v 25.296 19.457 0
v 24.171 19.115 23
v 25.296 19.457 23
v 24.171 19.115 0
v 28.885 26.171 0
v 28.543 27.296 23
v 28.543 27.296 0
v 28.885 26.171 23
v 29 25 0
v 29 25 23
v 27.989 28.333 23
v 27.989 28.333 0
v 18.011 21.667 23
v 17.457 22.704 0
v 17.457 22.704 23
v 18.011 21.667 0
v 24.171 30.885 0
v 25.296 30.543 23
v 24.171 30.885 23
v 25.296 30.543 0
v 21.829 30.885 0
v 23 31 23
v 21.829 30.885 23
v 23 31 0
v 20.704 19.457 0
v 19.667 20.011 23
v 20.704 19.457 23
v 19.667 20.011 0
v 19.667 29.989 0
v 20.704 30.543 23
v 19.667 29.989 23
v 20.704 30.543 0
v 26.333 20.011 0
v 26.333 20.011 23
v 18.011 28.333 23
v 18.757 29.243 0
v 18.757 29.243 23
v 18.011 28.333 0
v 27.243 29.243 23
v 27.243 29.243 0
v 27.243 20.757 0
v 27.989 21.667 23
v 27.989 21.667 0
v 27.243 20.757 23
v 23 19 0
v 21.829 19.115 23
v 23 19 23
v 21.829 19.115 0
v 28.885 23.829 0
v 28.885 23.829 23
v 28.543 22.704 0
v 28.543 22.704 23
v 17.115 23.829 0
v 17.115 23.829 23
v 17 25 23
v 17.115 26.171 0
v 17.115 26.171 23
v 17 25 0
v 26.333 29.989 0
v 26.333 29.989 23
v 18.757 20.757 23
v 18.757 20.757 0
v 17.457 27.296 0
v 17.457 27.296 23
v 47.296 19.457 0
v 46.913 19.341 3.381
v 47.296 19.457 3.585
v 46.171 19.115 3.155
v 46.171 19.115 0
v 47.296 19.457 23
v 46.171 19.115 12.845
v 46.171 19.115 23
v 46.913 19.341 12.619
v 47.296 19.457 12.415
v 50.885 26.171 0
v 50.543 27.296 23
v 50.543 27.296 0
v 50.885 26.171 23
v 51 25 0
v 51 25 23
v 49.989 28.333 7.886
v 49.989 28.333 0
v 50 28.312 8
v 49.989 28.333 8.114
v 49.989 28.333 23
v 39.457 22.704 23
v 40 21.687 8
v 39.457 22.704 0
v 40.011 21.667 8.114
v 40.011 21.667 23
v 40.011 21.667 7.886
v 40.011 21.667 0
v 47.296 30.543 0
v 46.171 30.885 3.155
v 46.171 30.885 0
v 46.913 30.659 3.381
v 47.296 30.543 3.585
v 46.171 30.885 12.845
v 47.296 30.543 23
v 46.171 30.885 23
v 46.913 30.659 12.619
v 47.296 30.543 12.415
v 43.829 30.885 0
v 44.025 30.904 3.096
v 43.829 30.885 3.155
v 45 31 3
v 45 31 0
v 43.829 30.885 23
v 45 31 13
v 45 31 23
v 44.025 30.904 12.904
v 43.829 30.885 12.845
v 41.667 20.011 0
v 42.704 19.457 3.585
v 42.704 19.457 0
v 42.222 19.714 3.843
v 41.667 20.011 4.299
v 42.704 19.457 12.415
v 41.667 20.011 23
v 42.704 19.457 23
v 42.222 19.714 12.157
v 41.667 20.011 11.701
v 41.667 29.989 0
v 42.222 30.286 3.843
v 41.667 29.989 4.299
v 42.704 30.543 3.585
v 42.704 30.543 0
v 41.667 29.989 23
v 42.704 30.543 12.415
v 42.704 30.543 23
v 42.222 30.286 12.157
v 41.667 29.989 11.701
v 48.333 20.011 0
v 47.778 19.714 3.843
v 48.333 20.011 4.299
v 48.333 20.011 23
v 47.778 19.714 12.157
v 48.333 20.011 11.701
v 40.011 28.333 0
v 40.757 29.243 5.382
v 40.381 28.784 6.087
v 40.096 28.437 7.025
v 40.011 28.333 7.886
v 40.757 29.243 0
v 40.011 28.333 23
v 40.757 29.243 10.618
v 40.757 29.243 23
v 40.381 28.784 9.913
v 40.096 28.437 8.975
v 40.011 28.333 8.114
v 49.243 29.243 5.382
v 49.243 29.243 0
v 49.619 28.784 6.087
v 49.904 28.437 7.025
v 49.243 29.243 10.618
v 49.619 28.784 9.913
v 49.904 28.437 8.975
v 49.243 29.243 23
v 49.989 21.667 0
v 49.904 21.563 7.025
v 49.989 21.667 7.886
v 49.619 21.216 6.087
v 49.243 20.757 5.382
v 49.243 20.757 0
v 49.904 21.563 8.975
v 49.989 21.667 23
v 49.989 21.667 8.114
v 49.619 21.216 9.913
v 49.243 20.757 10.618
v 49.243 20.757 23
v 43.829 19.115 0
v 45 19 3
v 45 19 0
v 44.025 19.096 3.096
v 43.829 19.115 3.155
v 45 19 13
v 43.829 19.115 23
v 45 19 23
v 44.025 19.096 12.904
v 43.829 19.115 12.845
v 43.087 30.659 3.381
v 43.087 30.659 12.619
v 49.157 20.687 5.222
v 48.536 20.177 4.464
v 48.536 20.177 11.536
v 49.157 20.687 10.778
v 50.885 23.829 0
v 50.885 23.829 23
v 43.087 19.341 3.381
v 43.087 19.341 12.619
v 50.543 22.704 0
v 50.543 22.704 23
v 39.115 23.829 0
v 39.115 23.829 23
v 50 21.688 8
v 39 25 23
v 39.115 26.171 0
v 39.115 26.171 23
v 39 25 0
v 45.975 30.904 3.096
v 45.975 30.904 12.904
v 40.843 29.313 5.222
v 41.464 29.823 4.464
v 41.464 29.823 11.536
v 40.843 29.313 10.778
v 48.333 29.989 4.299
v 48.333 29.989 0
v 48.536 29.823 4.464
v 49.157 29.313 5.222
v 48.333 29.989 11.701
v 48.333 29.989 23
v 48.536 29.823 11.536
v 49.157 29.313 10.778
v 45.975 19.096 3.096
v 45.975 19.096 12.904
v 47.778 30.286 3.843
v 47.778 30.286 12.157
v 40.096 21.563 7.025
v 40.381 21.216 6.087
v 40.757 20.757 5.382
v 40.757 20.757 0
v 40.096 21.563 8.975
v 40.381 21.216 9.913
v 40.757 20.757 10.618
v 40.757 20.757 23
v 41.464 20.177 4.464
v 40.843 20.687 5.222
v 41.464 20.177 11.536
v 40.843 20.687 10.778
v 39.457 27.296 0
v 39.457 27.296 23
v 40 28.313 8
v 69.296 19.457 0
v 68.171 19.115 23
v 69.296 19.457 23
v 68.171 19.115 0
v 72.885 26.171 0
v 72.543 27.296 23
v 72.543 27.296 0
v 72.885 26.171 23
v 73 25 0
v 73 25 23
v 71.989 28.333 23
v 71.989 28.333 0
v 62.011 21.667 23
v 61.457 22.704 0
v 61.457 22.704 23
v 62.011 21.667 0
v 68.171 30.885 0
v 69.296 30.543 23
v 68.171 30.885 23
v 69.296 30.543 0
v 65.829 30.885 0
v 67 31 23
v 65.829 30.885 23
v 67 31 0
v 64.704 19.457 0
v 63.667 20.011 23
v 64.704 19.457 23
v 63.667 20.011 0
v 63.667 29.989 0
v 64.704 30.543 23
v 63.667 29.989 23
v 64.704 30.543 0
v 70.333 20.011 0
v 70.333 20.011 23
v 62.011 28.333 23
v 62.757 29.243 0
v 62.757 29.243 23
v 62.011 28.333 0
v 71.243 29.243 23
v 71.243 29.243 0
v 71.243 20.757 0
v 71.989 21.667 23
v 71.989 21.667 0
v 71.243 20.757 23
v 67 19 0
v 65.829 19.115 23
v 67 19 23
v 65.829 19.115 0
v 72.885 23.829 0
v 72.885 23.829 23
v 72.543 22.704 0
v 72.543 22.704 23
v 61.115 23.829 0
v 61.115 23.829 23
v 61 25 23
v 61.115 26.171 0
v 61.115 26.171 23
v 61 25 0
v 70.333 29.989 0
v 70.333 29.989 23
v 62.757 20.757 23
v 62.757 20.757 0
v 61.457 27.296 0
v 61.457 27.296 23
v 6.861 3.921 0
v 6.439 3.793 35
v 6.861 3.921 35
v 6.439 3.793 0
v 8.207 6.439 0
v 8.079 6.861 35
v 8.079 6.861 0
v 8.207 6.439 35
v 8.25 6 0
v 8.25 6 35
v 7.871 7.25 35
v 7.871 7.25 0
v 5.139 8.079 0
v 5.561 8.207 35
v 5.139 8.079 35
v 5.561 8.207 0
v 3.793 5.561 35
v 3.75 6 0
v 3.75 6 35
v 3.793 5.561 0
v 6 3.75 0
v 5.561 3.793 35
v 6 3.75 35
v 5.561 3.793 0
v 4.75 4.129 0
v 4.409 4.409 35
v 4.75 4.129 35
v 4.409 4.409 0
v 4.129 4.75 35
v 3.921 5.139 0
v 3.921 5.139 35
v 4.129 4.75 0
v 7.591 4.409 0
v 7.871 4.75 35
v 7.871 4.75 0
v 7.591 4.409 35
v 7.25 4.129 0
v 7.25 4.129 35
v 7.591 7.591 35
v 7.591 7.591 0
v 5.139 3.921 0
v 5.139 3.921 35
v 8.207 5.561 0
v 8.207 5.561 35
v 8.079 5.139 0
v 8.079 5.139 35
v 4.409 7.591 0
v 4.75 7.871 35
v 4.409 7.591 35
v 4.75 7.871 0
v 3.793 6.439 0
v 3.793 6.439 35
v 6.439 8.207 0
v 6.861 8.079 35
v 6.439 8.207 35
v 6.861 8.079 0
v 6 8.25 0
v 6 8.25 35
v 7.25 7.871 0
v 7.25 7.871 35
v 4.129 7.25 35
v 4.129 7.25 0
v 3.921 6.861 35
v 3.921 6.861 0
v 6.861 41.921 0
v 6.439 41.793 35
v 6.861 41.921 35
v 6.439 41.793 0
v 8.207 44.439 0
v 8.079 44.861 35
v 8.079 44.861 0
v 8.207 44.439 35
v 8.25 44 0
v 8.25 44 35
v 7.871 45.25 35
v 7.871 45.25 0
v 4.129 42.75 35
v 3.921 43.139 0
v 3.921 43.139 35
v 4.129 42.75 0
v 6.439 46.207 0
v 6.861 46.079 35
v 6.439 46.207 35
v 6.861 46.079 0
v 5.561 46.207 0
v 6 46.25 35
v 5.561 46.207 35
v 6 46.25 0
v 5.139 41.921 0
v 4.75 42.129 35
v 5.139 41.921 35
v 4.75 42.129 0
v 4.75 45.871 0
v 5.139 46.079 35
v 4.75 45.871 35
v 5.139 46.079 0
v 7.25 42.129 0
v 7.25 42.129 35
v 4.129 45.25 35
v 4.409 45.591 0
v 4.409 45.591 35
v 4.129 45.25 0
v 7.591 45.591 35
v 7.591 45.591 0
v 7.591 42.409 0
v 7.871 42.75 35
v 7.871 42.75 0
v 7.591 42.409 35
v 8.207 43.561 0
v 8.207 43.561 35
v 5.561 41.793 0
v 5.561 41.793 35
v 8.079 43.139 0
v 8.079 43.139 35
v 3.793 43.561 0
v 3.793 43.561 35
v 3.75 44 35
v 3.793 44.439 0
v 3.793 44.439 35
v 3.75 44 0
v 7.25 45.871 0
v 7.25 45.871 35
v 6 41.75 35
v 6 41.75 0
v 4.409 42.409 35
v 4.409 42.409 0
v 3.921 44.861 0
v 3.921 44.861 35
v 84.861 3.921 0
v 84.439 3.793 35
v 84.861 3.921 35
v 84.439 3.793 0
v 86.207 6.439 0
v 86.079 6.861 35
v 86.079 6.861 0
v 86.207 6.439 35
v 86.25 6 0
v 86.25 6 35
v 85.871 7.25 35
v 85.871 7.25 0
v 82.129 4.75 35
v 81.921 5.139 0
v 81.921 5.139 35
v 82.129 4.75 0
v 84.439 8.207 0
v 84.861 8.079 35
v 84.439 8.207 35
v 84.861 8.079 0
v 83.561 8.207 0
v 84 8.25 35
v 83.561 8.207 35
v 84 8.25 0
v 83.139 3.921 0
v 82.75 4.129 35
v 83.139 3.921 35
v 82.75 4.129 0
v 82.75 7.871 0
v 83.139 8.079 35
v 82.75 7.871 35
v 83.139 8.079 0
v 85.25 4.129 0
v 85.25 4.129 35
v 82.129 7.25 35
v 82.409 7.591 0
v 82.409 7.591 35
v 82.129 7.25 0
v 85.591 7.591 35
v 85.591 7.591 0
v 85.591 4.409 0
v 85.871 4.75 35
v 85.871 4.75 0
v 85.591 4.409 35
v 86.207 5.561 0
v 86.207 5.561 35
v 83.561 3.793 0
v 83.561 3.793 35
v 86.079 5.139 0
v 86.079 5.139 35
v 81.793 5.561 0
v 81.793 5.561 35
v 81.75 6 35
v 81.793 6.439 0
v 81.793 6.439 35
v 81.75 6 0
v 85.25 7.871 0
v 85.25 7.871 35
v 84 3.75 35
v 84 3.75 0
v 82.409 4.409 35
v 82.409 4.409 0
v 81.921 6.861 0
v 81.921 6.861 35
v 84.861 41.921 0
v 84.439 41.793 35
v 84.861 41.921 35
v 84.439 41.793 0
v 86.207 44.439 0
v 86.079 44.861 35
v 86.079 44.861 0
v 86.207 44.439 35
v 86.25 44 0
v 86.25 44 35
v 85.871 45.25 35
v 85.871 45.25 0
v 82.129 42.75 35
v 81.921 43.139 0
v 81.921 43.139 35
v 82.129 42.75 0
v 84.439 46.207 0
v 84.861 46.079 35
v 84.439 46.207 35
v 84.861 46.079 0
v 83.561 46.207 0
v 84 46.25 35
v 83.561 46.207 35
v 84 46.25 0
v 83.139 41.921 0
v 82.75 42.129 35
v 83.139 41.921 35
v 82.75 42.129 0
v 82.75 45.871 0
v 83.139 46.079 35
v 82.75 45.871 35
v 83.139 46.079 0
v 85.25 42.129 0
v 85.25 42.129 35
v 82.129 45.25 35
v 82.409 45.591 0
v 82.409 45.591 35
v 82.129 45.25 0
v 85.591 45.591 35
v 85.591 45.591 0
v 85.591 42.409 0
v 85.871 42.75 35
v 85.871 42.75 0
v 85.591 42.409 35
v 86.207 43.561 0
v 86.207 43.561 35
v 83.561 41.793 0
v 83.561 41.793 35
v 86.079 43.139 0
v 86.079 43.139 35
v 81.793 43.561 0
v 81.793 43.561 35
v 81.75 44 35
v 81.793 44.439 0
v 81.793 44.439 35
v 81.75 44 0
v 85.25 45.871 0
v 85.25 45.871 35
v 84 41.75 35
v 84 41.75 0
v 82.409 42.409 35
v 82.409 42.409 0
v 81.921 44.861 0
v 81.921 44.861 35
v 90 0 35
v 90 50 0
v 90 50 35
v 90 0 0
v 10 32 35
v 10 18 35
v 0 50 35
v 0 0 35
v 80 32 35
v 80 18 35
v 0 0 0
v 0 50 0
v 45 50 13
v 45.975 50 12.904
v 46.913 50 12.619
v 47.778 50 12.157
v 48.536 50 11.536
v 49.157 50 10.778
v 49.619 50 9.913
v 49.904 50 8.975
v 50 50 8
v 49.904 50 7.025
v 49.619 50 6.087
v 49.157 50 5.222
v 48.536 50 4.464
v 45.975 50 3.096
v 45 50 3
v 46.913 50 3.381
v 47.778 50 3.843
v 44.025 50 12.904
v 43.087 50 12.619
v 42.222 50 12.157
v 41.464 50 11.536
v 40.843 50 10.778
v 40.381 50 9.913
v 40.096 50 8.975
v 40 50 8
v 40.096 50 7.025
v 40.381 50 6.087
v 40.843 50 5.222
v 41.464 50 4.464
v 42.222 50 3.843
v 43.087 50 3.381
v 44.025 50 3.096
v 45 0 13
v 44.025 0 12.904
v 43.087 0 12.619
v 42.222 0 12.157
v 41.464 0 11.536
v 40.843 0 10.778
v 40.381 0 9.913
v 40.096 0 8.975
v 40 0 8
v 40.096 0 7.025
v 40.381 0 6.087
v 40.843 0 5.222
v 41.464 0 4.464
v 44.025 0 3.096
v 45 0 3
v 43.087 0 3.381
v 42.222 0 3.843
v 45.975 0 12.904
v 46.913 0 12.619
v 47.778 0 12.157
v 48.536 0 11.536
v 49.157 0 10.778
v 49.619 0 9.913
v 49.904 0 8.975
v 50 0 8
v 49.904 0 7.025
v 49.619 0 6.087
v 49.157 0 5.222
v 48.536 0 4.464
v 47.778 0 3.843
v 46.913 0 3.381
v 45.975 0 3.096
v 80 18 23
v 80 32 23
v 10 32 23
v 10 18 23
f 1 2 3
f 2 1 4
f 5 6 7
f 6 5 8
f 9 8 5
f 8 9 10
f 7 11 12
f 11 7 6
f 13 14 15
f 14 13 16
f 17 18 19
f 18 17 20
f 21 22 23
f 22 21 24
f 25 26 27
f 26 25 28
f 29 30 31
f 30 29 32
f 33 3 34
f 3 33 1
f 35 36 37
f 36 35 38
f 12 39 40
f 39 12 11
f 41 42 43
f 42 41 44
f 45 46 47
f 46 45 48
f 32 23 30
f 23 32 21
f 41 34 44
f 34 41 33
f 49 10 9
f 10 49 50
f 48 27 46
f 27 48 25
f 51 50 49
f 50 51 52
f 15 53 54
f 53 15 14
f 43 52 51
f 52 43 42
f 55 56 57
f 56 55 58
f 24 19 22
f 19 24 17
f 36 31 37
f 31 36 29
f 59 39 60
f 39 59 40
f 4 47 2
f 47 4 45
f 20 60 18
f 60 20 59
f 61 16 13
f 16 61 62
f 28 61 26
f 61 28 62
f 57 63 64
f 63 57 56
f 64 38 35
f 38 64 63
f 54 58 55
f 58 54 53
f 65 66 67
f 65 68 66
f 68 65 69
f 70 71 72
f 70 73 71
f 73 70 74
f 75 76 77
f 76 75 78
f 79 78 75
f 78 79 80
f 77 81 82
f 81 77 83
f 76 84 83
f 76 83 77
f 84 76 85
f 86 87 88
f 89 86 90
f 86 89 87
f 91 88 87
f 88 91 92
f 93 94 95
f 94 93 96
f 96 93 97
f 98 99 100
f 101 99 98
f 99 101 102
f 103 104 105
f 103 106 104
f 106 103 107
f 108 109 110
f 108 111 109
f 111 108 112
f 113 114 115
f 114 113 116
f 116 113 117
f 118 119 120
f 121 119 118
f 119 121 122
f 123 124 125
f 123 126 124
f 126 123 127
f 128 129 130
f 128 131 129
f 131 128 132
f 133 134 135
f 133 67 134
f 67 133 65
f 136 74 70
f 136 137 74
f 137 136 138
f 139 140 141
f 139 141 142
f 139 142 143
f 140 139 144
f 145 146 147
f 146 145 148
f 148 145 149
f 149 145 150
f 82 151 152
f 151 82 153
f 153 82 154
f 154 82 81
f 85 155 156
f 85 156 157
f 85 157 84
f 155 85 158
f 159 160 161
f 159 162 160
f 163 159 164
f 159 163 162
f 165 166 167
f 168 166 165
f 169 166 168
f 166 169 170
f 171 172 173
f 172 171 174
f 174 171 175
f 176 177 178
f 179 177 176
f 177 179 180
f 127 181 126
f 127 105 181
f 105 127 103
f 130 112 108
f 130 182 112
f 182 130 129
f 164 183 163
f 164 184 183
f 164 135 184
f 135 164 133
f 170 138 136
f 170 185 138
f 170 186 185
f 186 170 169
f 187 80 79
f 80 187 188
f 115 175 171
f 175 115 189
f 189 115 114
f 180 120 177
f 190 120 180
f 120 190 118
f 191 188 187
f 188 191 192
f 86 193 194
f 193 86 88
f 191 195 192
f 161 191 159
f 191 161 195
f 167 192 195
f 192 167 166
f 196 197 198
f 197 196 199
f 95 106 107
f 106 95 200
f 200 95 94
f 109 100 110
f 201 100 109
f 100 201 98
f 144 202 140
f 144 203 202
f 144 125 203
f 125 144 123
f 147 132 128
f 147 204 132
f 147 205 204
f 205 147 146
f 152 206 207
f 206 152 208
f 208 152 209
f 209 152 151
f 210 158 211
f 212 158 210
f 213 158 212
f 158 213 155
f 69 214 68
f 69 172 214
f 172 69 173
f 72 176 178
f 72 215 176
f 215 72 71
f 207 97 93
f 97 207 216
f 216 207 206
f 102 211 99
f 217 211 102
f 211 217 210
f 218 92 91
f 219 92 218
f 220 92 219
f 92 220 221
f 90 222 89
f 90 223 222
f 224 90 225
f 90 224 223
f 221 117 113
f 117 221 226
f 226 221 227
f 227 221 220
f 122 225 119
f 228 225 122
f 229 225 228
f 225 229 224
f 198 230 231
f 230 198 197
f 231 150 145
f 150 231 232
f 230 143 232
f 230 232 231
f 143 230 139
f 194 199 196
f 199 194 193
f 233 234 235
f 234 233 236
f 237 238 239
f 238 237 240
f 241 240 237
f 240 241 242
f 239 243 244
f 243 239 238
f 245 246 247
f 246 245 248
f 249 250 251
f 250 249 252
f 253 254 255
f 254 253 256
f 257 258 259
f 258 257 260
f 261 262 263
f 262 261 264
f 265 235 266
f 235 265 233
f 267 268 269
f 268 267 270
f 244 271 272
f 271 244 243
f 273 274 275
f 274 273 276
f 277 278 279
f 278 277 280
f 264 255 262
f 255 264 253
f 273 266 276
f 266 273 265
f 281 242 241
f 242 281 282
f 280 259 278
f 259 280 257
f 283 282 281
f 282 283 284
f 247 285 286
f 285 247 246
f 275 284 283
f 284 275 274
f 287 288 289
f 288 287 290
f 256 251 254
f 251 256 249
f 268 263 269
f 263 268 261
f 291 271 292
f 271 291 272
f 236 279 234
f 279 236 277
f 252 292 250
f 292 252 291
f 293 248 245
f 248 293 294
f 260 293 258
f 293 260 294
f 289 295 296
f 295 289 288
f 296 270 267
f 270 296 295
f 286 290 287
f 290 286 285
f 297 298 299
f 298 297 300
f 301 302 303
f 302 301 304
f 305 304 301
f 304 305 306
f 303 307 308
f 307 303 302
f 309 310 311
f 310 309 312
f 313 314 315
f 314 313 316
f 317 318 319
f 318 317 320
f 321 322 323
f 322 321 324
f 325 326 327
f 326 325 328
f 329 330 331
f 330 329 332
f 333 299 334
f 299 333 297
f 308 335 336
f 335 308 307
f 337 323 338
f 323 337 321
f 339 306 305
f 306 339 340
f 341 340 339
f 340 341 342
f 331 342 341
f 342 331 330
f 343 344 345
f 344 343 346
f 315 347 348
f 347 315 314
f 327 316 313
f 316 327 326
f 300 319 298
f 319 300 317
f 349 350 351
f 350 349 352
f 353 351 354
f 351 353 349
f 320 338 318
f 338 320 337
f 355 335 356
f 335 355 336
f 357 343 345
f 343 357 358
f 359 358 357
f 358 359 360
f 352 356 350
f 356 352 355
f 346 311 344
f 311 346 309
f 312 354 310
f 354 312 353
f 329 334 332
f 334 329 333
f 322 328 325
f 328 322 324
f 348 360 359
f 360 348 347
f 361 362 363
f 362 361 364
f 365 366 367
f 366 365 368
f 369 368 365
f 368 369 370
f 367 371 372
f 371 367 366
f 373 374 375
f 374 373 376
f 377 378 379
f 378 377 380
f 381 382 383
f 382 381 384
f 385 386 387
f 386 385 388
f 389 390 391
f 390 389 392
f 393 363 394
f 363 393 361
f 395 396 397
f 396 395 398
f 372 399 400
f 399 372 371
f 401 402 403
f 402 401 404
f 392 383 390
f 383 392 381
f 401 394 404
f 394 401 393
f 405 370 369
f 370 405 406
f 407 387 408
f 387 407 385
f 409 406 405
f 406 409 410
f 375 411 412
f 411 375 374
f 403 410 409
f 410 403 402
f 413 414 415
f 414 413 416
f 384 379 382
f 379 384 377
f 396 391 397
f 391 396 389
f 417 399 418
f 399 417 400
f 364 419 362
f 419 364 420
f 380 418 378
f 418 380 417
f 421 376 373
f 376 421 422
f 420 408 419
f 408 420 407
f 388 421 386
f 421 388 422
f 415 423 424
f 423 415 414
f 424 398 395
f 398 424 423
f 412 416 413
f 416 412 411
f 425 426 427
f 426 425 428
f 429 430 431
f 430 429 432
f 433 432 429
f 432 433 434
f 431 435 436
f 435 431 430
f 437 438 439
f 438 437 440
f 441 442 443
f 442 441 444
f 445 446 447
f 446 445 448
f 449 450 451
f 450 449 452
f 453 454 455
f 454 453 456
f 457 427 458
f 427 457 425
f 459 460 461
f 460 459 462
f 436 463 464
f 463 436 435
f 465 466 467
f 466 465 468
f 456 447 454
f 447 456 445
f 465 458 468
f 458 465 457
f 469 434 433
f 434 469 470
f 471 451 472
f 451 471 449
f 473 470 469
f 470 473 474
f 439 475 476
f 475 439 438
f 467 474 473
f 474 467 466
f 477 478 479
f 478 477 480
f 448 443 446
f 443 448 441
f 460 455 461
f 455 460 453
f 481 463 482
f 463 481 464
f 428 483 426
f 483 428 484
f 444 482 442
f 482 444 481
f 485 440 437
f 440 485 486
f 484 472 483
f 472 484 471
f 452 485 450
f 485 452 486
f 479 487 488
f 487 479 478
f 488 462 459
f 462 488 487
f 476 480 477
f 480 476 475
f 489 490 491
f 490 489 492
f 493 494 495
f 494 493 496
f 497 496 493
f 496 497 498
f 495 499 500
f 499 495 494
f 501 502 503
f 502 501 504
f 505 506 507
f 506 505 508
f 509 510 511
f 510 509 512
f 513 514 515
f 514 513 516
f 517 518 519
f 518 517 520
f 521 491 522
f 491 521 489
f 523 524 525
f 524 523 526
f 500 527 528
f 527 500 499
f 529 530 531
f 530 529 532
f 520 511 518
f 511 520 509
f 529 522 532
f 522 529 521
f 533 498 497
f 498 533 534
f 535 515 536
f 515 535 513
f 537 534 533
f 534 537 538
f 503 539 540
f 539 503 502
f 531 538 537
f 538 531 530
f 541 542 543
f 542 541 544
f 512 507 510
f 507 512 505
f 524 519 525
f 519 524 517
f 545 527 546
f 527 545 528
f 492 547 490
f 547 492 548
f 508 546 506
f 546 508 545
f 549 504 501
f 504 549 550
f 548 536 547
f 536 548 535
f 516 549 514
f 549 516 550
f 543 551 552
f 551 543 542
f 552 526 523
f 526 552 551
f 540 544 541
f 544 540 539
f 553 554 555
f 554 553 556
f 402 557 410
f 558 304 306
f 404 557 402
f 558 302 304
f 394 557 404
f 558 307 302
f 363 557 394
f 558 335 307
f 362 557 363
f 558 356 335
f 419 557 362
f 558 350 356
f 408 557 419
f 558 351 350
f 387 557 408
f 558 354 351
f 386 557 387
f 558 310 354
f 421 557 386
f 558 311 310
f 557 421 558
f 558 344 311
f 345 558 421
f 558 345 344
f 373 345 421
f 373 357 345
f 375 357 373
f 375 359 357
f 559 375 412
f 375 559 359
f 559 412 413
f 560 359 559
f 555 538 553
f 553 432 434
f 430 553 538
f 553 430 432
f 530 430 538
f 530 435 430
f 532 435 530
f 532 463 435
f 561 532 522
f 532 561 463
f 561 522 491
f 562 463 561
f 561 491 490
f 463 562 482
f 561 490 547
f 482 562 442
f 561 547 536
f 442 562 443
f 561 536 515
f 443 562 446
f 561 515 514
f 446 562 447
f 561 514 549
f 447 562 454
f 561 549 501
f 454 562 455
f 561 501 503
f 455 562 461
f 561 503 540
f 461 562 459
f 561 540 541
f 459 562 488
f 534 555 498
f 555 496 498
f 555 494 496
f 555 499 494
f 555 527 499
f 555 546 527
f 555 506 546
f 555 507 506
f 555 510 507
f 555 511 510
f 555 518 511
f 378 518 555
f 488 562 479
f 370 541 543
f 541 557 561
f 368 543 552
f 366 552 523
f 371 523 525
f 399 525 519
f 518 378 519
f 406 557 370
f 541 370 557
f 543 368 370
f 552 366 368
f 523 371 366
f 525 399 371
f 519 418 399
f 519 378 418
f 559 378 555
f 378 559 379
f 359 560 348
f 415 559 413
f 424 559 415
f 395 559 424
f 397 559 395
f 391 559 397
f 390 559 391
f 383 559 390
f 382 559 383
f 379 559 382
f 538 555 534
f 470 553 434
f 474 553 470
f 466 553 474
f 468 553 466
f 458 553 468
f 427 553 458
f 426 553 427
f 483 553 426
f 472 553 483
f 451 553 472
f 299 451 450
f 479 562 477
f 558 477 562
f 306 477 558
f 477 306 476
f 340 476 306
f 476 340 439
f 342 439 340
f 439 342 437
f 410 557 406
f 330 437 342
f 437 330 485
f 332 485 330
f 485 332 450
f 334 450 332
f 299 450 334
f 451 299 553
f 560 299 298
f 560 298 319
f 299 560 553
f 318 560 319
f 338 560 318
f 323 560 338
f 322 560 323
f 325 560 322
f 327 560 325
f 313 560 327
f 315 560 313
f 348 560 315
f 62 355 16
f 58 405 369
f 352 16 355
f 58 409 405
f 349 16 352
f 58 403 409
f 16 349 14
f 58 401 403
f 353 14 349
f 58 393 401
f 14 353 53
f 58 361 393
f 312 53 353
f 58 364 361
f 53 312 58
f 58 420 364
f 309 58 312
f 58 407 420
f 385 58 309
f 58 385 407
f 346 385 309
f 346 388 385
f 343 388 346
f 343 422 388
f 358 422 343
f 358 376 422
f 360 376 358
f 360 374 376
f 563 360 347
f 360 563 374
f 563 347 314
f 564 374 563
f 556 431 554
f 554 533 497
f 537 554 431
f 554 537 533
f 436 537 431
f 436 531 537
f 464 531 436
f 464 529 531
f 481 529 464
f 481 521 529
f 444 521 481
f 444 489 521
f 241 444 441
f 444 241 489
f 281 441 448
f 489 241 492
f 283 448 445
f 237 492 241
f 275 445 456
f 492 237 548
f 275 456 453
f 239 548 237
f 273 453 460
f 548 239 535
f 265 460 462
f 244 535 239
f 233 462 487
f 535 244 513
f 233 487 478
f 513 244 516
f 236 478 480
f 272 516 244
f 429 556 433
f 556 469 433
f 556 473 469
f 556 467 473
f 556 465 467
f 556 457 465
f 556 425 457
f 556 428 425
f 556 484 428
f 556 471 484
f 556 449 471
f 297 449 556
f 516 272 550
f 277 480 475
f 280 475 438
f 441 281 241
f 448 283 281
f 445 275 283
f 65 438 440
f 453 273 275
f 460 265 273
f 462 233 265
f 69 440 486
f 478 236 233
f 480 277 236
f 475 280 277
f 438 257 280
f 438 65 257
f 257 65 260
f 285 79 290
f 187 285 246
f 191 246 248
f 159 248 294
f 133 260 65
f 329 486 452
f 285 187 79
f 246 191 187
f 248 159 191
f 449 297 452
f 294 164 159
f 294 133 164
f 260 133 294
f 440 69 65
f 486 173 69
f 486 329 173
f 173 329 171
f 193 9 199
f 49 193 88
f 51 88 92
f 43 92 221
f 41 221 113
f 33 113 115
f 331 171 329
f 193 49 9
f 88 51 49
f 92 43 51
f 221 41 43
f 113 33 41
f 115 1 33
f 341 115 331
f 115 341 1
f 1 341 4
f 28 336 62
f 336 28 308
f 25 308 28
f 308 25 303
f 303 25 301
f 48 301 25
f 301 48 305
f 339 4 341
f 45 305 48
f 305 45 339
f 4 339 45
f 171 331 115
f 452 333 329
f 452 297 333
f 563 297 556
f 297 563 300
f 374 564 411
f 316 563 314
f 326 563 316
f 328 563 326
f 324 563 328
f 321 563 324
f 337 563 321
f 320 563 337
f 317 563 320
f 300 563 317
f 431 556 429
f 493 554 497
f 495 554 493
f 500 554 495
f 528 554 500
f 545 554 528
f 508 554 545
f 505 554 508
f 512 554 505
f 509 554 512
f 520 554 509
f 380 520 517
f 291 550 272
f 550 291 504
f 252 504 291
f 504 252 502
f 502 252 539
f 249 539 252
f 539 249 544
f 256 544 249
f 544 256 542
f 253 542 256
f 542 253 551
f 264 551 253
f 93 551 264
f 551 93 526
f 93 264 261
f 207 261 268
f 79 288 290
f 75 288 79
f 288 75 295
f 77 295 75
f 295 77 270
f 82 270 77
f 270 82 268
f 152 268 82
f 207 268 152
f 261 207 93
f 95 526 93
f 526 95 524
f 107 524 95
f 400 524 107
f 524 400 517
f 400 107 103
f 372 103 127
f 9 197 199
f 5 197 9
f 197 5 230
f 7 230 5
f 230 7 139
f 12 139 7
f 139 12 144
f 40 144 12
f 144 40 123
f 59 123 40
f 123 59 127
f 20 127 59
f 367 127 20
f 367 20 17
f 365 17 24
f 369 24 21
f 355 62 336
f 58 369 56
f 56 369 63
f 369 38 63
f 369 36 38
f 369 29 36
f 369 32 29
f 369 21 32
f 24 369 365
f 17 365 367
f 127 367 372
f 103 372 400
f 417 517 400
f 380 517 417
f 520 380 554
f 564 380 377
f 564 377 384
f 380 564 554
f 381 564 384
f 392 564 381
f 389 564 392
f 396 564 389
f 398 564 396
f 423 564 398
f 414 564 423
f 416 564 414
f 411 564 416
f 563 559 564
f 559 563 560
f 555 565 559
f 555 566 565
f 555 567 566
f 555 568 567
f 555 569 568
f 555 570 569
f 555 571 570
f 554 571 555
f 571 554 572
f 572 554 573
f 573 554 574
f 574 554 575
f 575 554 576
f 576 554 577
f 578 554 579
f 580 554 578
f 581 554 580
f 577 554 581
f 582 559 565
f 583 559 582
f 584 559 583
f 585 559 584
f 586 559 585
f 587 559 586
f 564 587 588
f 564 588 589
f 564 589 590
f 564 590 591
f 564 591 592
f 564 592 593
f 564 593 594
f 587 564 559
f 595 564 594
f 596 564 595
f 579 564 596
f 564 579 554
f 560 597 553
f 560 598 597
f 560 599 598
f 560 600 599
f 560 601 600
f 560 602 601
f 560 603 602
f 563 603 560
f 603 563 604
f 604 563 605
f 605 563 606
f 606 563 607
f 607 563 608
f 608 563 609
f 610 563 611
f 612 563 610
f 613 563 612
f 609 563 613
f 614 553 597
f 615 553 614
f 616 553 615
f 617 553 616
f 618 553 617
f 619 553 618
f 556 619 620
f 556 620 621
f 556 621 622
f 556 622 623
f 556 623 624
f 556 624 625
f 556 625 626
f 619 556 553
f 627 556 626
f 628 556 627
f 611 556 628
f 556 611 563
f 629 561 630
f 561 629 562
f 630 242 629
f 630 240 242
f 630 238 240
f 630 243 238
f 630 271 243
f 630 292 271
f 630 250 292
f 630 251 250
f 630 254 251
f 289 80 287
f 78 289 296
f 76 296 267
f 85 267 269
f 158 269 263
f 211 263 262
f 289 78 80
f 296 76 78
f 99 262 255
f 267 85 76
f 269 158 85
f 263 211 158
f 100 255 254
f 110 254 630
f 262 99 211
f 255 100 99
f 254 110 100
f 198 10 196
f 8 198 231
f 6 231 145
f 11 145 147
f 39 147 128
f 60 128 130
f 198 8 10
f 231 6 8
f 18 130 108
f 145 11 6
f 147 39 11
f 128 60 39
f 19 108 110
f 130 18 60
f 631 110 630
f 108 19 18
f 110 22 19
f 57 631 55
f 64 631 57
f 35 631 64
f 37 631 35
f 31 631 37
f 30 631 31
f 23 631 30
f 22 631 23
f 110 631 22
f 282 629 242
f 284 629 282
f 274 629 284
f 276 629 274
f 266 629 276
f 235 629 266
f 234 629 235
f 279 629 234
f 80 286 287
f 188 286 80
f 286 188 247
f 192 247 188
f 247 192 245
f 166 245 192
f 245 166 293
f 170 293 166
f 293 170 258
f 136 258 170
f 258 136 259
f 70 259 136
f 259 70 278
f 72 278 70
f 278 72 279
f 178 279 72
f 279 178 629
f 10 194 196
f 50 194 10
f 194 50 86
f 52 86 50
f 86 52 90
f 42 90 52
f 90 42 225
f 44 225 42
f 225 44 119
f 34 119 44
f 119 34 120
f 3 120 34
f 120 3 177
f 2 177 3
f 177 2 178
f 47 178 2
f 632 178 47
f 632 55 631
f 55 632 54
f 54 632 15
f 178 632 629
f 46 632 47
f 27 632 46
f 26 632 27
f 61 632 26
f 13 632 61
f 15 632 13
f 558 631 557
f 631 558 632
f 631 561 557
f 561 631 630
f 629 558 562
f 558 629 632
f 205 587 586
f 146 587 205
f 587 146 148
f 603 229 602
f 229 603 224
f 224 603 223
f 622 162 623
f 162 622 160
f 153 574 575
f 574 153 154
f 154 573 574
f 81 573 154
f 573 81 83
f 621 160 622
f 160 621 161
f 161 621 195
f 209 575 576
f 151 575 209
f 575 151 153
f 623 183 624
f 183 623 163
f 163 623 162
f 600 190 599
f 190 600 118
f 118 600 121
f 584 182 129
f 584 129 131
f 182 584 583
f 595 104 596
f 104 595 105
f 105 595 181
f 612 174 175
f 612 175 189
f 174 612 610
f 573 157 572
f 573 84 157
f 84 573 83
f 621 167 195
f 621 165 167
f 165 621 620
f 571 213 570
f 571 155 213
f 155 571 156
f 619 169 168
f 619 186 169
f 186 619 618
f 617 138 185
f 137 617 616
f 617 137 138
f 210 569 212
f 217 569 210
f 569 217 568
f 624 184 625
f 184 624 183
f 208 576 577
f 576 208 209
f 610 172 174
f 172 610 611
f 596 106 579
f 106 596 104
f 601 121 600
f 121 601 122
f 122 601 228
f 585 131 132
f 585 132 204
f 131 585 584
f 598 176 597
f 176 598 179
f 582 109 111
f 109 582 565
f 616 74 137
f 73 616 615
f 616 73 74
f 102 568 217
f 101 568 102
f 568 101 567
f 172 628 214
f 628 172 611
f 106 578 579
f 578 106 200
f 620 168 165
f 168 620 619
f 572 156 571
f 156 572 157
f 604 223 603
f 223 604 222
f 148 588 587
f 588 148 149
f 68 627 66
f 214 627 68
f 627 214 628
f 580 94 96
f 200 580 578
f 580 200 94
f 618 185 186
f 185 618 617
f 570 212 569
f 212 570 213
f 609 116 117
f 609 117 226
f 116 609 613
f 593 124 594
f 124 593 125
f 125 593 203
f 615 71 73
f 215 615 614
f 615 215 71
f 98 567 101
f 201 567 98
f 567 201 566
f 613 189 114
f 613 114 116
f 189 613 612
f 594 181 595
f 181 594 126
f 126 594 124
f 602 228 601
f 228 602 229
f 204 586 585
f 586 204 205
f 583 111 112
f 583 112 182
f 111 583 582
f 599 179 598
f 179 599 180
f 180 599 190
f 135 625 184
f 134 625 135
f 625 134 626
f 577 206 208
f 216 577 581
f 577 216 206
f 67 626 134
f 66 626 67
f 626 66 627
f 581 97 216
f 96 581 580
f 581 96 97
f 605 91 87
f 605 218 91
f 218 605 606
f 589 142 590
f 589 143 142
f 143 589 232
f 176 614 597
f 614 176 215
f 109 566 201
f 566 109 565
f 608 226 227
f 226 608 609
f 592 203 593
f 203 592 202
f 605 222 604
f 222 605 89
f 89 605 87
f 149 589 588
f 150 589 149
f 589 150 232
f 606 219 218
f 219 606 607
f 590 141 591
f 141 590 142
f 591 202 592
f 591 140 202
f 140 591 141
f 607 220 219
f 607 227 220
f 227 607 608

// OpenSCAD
$fn = 32;

// ----------------------------------------------------------------------
// Manifold block: side_outlet manifold
// ----------------------------------------------------------------------

// --- parameters (mm) ---
block_l = 90;             // block length, X
block_w = 50;             // block width, Y
block_h = 35;             // block height, Z
port_d = 12;              // port bore diameter
port_pitch = 22;          // port pitch along X
gallery_d = 14;           // top gallery width, Y
gallery_depth = 12;       // gallery pocket depth
wall_p = 10;              // gallery end wall thickness, X
mnt_d = 4.5;              // mounting hole diameter
mnt_in = 6;               // mounting hole inset from the edges
out_d = 10;               // outlet bore diameter
out_z = 8;                // outlet axis height

n_ports = 3;  // ports in the row
port_x0 = (block_l - (n_ports - 1) * port_pitch) / 2;  // first port X

difference() {
  cube([block_l, block_w, block_h]);
  for (i = [0 : n_ports - 1])
    translate([port_x0 + i * port_pitch, block_w / 2, -1])
      cylinder(h = block_h + 2, d = port_d);
  translate([wall_p, block_w / 2 - gallery_d / 2, block_h - gallery_depth])
    cube([block_l - 2 * wall_p, gallery_d, gallery_depth + 1]);
  for (cx = [mnt_in, block_l - mnt_in])
    for (cy = [mnt_in, block_w - mnt_in])
      translate([cx, cy, -1]) cylinder(h = block_h + 2, d = mnt_d);
  translate([block_l / 2, -1, out_z]) rotate([-90, 0, 0])
    cylinder(h = block_w + 2, d = out_d);
}
